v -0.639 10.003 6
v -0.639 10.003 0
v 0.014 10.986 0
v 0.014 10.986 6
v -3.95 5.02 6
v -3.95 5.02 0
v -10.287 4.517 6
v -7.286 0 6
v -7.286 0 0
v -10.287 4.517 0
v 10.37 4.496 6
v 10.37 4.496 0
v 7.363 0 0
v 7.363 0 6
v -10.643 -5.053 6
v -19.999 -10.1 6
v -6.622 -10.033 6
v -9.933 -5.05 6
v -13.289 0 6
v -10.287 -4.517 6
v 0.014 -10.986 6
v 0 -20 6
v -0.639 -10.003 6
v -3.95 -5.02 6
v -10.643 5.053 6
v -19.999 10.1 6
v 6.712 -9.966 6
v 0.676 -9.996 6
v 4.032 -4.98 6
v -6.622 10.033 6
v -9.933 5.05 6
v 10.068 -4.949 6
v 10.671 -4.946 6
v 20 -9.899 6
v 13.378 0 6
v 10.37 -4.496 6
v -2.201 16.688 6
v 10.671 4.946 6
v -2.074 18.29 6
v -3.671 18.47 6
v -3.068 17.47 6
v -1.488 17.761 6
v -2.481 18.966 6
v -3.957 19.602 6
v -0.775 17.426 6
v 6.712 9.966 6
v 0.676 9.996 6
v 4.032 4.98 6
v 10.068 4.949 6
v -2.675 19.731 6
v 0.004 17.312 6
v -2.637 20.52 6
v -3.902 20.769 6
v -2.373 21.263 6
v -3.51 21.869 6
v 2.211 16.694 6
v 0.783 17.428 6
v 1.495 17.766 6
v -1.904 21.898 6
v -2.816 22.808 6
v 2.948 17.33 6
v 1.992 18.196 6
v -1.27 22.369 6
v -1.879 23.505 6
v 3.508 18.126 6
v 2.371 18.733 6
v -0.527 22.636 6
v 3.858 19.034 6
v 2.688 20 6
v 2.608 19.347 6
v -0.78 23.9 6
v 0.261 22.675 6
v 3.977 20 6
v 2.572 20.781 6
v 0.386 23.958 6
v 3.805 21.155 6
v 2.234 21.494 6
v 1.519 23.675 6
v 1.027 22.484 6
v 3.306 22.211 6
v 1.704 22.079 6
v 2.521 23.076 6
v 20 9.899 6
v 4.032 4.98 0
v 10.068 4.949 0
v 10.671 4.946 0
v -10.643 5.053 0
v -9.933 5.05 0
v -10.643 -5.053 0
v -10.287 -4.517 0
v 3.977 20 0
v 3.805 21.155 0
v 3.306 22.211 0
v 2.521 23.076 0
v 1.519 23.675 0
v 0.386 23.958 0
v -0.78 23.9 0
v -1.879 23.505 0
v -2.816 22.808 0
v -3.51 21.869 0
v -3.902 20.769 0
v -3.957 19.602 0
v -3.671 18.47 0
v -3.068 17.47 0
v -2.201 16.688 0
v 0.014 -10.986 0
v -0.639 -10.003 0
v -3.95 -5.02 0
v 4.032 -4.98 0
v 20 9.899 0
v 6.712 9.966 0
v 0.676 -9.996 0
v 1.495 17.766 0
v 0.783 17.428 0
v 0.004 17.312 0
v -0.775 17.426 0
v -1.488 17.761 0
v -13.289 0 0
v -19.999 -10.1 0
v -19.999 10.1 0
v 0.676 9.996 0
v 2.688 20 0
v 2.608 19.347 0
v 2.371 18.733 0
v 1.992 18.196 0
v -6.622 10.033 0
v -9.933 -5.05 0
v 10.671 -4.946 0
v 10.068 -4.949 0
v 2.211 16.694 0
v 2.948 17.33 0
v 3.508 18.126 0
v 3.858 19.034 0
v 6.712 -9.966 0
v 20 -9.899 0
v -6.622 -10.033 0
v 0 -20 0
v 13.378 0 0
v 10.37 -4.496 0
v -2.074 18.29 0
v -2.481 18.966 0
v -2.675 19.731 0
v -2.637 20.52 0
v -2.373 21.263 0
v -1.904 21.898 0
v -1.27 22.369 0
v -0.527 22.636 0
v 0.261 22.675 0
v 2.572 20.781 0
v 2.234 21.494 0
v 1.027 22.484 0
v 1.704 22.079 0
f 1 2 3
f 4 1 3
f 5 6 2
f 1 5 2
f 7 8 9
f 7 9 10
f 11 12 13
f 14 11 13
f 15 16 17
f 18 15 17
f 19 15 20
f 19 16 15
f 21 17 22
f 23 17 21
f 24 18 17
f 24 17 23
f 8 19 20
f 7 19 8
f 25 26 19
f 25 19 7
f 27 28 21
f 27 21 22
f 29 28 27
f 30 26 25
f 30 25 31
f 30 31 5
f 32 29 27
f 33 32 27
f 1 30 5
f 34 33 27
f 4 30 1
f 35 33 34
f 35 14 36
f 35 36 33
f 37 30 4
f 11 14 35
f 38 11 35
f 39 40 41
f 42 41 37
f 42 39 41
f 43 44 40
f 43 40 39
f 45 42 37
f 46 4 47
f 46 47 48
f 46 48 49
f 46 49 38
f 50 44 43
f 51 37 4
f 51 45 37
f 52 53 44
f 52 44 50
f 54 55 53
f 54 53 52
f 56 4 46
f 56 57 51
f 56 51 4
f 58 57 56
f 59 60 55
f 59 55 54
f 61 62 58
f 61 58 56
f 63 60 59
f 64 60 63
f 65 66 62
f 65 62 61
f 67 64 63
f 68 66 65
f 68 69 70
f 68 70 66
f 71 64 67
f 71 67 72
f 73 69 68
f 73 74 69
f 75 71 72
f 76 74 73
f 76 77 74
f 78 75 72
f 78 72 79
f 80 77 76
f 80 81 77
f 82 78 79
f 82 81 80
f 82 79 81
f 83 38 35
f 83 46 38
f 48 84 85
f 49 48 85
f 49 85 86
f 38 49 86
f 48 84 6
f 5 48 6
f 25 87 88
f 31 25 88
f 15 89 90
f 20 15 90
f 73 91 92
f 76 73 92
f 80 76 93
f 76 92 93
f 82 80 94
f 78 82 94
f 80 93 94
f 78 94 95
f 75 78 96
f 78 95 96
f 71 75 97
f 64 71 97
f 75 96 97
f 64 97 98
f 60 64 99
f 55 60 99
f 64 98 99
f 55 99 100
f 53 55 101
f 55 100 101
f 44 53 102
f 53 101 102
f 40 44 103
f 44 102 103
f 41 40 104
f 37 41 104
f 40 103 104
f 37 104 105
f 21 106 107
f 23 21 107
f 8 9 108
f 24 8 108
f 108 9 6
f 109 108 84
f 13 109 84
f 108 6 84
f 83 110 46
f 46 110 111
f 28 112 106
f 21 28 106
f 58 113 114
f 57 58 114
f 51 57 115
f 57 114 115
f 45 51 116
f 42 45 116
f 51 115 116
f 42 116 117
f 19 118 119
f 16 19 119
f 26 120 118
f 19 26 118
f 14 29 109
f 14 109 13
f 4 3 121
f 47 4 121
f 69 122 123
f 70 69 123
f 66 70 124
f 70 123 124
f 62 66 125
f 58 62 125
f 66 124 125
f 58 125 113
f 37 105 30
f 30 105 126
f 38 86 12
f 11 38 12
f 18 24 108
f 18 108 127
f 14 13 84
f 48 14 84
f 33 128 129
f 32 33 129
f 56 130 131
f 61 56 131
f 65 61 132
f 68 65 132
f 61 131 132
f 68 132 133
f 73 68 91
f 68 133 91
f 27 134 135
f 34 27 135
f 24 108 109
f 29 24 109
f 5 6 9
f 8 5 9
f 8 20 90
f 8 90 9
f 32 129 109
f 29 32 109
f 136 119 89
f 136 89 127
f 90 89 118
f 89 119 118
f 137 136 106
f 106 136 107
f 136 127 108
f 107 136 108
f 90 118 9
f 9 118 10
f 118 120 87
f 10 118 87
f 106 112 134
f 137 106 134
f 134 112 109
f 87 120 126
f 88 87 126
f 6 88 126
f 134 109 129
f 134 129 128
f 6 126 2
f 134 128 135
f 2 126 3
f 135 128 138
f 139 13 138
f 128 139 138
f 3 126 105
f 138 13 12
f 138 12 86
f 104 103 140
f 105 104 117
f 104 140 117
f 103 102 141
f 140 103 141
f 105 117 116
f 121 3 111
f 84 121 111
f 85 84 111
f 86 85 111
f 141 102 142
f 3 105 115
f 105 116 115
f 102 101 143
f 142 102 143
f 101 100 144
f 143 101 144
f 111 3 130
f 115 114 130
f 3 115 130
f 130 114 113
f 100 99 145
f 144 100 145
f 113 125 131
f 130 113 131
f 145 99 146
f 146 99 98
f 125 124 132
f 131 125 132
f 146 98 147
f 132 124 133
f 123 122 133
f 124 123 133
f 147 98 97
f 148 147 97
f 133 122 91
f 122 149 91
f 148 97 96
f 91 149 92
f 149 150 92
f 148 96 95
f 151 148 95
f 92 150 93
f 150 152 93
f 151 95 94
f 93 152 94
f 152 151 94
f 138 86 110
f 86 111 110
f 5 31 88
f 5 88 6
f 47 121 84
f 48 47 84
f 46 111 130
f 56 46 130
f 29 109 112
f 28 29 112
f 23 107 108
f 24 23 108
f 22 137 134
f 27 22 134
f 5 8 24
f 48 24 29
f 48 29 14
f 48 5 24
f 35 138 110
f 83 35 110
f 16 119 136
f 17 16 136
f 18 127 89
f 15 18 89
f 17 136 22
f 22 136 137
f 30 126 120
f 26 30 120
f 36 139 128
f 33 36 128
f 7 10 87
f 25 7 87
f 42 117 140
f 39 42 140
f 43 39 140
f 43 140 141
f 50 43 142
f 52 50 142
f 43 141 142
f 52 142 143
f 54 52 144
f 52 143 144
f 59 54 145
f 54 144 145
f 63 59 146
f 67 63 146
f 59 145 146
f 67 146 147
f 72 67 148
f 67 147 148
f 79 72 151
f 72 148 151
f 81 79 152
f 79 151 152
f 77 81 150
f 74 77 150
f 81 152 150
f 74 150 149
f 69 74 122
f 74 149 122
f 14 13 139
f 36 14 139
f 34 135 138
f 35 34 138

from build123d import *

# Parameters (mm, degrees)
F1_DEPTH = 6


with BuildPart() as f1:
    # F0 (on Top) → F1 (new body)
    with BuildSketch(Plane.XY):
        Polygon((-6.6222884523, 10.0331163724), (-19.9994960478, 10.100266872), (-13.2885838739, 0), (-10.2870570193, 4.5174517964), (-10.6430481273, 5.0532366646), (-9.9334326785, 5.0496745586), align=None)
        with BuildLine():
            Line((-2.2008863986, 16.6875531366), (-6.6222884523, 10.0331163724))
            Line((-6.6222884523, 10.0331163724), (-0.6391900602, 10.0030825972))
            Line((-0.6391900602, 10.0030825972), (0.0139746531, 10.9861289766))
            Line((0.0139746531, 10.9861289766), (0.6759581834, 9.996480856))
            Line((0.6759581834, 9.996480856), (6.7117004327, 9.9661828208))
            Line((6.7117004327, 9.9661828208), (2.2111466966, 16.6943933311))
            ThreePointArc((2.2111466966, 16.6943933311), (0.0061656706, 16.0230454934), (-2.2008863986, 16.6875531366))
        make_face()
        Polygon((20, 9.899478619), (6.7117004327, 9.9661828208), (10.067550649, 4.9492742312), (10.6712659717, 4.9462437194), (10.3704218772, 4.4964896407), (13.378159703, 0), align=None)
        Polygon((6.7117004327, 9.9661828208), (0.6759581834, 9.996480856), (4.0318083997, 4.9795722664), (10.067550649, 4.9492742312), align=None)
        Polygon((10.3704218772, 4.4964896407), (7.3626840514, 0), (10.3704218772, -4.4964896407), (13.378159703, 0), align=None)
        Polygon((10.067550649, -4.9492742312), (6.7117004327, -9.9661828208), (20, -9.899478619), (13.378159703, 0), (10.3704218772, -4.4964896407), (10.6712659717, -4.9462437194), align=None)
        Polygon((10.067550649, -4.9492742312), (4.0318083997, -4.9795722664), (0.6759581834, -9.996480856), (6.7117004327, -9.9661828208), align=None)
        Polygon((-0.6391900602, -10.0030825972), (-6.6222884523, -10.0331163724), (0, -20), (6.7117004327, -9.9661828208), (0.6759581834, -9.996480856), (0.0139746531, -10.9861289766), align=None)
        Polygon((-10.2870570193, -4.5174517964), (-13.2885838739, 0), (-19.9994960478, -10.100266872), (-6.6222884523, -10.0331163724), (-9.9334326785, -5.0496745586), (-10.6430481273, -5.0532366646), align=None)
        Polygon((-9.9334326785, -5.0496745586), (-6.6222884523, -10.0331163724), (-0.6391900602, -10.0030825972), (-3.9503342863, -5.0196407834), align=None)
        Polygon((-10.2870570193, 4.5174517964), (-13.2885838739, 0), (-10.2870570193, -4.5174517964), (-7.2855301647, 0), align=None)
        Polygon((-0.6391900602, 10.0030825972), (-6.6222884523, 10.0331163724), (-9.9334326785, 5.0496745586), (-3.9503342863, 5.0196407834), align=None)
        with BuildLine():
            ThreePointArc((3.976959286, 20), (-1.8792777286, 23.5049280138), (-2.2008863986, 16.6875531366))
            Line((-2.2008863986, 16.6875531366), (-1.4876022169, 17.7610823983))
            ThreePointArc((-1.4876022169, 17.7610823983), (-1.2702235412, 22.3690176315), (2.6880685227, 20))
            ThreePointArc((2.6880685227, 20), (2.3709840728, 18.7334507869), (1.4945372599, 17.7657057576))
            Line((1.4945372599, 17.7657057576), (2.2111466966, 16.6943933311))
            ThreePointArc((2.2111466966, 16.6943933311), (3.5078373359, 18.1261583878), (3.976959286, 20))
        make_face()
        with BuildLine():
            Line((-1.4876022169, 17.7610823983), (-2.2008863986, 16.6875531366))
            ThreePointArc((-2.2008863986, 16.6875531366), (0.0061656706, 16.0230454934), (2.2111466966, 16.6943933311))
            Line((2.2111466966, 16.6943933311), (1.4945372599, 17.7657057576))
            ThreePointArc((1.4945372599, 17.7657057576), (0.0041674415, 17.3119347078), (-1.4876022169, 17.7610823983))
        make_face()
    extrude(amount=F1_DEPTH)


with BuildPart() as f1b:
    # F0 (on Top) → F1, piece 2 (new body)
    with BuildSketch(Plane.XY):
        Polygon((4.0318083997, 4.9795722664), (-3.9503342863, 5.0196407834), (-7.2855301647, 0), (-3.9503342863, -5.0196407834), (4.0318083997, -4.9795722664), (7.3626840514, 0), align=None)
    extrude(amount=F1_DEPTH)


solid = Compound([f1.part, f1b.part])
